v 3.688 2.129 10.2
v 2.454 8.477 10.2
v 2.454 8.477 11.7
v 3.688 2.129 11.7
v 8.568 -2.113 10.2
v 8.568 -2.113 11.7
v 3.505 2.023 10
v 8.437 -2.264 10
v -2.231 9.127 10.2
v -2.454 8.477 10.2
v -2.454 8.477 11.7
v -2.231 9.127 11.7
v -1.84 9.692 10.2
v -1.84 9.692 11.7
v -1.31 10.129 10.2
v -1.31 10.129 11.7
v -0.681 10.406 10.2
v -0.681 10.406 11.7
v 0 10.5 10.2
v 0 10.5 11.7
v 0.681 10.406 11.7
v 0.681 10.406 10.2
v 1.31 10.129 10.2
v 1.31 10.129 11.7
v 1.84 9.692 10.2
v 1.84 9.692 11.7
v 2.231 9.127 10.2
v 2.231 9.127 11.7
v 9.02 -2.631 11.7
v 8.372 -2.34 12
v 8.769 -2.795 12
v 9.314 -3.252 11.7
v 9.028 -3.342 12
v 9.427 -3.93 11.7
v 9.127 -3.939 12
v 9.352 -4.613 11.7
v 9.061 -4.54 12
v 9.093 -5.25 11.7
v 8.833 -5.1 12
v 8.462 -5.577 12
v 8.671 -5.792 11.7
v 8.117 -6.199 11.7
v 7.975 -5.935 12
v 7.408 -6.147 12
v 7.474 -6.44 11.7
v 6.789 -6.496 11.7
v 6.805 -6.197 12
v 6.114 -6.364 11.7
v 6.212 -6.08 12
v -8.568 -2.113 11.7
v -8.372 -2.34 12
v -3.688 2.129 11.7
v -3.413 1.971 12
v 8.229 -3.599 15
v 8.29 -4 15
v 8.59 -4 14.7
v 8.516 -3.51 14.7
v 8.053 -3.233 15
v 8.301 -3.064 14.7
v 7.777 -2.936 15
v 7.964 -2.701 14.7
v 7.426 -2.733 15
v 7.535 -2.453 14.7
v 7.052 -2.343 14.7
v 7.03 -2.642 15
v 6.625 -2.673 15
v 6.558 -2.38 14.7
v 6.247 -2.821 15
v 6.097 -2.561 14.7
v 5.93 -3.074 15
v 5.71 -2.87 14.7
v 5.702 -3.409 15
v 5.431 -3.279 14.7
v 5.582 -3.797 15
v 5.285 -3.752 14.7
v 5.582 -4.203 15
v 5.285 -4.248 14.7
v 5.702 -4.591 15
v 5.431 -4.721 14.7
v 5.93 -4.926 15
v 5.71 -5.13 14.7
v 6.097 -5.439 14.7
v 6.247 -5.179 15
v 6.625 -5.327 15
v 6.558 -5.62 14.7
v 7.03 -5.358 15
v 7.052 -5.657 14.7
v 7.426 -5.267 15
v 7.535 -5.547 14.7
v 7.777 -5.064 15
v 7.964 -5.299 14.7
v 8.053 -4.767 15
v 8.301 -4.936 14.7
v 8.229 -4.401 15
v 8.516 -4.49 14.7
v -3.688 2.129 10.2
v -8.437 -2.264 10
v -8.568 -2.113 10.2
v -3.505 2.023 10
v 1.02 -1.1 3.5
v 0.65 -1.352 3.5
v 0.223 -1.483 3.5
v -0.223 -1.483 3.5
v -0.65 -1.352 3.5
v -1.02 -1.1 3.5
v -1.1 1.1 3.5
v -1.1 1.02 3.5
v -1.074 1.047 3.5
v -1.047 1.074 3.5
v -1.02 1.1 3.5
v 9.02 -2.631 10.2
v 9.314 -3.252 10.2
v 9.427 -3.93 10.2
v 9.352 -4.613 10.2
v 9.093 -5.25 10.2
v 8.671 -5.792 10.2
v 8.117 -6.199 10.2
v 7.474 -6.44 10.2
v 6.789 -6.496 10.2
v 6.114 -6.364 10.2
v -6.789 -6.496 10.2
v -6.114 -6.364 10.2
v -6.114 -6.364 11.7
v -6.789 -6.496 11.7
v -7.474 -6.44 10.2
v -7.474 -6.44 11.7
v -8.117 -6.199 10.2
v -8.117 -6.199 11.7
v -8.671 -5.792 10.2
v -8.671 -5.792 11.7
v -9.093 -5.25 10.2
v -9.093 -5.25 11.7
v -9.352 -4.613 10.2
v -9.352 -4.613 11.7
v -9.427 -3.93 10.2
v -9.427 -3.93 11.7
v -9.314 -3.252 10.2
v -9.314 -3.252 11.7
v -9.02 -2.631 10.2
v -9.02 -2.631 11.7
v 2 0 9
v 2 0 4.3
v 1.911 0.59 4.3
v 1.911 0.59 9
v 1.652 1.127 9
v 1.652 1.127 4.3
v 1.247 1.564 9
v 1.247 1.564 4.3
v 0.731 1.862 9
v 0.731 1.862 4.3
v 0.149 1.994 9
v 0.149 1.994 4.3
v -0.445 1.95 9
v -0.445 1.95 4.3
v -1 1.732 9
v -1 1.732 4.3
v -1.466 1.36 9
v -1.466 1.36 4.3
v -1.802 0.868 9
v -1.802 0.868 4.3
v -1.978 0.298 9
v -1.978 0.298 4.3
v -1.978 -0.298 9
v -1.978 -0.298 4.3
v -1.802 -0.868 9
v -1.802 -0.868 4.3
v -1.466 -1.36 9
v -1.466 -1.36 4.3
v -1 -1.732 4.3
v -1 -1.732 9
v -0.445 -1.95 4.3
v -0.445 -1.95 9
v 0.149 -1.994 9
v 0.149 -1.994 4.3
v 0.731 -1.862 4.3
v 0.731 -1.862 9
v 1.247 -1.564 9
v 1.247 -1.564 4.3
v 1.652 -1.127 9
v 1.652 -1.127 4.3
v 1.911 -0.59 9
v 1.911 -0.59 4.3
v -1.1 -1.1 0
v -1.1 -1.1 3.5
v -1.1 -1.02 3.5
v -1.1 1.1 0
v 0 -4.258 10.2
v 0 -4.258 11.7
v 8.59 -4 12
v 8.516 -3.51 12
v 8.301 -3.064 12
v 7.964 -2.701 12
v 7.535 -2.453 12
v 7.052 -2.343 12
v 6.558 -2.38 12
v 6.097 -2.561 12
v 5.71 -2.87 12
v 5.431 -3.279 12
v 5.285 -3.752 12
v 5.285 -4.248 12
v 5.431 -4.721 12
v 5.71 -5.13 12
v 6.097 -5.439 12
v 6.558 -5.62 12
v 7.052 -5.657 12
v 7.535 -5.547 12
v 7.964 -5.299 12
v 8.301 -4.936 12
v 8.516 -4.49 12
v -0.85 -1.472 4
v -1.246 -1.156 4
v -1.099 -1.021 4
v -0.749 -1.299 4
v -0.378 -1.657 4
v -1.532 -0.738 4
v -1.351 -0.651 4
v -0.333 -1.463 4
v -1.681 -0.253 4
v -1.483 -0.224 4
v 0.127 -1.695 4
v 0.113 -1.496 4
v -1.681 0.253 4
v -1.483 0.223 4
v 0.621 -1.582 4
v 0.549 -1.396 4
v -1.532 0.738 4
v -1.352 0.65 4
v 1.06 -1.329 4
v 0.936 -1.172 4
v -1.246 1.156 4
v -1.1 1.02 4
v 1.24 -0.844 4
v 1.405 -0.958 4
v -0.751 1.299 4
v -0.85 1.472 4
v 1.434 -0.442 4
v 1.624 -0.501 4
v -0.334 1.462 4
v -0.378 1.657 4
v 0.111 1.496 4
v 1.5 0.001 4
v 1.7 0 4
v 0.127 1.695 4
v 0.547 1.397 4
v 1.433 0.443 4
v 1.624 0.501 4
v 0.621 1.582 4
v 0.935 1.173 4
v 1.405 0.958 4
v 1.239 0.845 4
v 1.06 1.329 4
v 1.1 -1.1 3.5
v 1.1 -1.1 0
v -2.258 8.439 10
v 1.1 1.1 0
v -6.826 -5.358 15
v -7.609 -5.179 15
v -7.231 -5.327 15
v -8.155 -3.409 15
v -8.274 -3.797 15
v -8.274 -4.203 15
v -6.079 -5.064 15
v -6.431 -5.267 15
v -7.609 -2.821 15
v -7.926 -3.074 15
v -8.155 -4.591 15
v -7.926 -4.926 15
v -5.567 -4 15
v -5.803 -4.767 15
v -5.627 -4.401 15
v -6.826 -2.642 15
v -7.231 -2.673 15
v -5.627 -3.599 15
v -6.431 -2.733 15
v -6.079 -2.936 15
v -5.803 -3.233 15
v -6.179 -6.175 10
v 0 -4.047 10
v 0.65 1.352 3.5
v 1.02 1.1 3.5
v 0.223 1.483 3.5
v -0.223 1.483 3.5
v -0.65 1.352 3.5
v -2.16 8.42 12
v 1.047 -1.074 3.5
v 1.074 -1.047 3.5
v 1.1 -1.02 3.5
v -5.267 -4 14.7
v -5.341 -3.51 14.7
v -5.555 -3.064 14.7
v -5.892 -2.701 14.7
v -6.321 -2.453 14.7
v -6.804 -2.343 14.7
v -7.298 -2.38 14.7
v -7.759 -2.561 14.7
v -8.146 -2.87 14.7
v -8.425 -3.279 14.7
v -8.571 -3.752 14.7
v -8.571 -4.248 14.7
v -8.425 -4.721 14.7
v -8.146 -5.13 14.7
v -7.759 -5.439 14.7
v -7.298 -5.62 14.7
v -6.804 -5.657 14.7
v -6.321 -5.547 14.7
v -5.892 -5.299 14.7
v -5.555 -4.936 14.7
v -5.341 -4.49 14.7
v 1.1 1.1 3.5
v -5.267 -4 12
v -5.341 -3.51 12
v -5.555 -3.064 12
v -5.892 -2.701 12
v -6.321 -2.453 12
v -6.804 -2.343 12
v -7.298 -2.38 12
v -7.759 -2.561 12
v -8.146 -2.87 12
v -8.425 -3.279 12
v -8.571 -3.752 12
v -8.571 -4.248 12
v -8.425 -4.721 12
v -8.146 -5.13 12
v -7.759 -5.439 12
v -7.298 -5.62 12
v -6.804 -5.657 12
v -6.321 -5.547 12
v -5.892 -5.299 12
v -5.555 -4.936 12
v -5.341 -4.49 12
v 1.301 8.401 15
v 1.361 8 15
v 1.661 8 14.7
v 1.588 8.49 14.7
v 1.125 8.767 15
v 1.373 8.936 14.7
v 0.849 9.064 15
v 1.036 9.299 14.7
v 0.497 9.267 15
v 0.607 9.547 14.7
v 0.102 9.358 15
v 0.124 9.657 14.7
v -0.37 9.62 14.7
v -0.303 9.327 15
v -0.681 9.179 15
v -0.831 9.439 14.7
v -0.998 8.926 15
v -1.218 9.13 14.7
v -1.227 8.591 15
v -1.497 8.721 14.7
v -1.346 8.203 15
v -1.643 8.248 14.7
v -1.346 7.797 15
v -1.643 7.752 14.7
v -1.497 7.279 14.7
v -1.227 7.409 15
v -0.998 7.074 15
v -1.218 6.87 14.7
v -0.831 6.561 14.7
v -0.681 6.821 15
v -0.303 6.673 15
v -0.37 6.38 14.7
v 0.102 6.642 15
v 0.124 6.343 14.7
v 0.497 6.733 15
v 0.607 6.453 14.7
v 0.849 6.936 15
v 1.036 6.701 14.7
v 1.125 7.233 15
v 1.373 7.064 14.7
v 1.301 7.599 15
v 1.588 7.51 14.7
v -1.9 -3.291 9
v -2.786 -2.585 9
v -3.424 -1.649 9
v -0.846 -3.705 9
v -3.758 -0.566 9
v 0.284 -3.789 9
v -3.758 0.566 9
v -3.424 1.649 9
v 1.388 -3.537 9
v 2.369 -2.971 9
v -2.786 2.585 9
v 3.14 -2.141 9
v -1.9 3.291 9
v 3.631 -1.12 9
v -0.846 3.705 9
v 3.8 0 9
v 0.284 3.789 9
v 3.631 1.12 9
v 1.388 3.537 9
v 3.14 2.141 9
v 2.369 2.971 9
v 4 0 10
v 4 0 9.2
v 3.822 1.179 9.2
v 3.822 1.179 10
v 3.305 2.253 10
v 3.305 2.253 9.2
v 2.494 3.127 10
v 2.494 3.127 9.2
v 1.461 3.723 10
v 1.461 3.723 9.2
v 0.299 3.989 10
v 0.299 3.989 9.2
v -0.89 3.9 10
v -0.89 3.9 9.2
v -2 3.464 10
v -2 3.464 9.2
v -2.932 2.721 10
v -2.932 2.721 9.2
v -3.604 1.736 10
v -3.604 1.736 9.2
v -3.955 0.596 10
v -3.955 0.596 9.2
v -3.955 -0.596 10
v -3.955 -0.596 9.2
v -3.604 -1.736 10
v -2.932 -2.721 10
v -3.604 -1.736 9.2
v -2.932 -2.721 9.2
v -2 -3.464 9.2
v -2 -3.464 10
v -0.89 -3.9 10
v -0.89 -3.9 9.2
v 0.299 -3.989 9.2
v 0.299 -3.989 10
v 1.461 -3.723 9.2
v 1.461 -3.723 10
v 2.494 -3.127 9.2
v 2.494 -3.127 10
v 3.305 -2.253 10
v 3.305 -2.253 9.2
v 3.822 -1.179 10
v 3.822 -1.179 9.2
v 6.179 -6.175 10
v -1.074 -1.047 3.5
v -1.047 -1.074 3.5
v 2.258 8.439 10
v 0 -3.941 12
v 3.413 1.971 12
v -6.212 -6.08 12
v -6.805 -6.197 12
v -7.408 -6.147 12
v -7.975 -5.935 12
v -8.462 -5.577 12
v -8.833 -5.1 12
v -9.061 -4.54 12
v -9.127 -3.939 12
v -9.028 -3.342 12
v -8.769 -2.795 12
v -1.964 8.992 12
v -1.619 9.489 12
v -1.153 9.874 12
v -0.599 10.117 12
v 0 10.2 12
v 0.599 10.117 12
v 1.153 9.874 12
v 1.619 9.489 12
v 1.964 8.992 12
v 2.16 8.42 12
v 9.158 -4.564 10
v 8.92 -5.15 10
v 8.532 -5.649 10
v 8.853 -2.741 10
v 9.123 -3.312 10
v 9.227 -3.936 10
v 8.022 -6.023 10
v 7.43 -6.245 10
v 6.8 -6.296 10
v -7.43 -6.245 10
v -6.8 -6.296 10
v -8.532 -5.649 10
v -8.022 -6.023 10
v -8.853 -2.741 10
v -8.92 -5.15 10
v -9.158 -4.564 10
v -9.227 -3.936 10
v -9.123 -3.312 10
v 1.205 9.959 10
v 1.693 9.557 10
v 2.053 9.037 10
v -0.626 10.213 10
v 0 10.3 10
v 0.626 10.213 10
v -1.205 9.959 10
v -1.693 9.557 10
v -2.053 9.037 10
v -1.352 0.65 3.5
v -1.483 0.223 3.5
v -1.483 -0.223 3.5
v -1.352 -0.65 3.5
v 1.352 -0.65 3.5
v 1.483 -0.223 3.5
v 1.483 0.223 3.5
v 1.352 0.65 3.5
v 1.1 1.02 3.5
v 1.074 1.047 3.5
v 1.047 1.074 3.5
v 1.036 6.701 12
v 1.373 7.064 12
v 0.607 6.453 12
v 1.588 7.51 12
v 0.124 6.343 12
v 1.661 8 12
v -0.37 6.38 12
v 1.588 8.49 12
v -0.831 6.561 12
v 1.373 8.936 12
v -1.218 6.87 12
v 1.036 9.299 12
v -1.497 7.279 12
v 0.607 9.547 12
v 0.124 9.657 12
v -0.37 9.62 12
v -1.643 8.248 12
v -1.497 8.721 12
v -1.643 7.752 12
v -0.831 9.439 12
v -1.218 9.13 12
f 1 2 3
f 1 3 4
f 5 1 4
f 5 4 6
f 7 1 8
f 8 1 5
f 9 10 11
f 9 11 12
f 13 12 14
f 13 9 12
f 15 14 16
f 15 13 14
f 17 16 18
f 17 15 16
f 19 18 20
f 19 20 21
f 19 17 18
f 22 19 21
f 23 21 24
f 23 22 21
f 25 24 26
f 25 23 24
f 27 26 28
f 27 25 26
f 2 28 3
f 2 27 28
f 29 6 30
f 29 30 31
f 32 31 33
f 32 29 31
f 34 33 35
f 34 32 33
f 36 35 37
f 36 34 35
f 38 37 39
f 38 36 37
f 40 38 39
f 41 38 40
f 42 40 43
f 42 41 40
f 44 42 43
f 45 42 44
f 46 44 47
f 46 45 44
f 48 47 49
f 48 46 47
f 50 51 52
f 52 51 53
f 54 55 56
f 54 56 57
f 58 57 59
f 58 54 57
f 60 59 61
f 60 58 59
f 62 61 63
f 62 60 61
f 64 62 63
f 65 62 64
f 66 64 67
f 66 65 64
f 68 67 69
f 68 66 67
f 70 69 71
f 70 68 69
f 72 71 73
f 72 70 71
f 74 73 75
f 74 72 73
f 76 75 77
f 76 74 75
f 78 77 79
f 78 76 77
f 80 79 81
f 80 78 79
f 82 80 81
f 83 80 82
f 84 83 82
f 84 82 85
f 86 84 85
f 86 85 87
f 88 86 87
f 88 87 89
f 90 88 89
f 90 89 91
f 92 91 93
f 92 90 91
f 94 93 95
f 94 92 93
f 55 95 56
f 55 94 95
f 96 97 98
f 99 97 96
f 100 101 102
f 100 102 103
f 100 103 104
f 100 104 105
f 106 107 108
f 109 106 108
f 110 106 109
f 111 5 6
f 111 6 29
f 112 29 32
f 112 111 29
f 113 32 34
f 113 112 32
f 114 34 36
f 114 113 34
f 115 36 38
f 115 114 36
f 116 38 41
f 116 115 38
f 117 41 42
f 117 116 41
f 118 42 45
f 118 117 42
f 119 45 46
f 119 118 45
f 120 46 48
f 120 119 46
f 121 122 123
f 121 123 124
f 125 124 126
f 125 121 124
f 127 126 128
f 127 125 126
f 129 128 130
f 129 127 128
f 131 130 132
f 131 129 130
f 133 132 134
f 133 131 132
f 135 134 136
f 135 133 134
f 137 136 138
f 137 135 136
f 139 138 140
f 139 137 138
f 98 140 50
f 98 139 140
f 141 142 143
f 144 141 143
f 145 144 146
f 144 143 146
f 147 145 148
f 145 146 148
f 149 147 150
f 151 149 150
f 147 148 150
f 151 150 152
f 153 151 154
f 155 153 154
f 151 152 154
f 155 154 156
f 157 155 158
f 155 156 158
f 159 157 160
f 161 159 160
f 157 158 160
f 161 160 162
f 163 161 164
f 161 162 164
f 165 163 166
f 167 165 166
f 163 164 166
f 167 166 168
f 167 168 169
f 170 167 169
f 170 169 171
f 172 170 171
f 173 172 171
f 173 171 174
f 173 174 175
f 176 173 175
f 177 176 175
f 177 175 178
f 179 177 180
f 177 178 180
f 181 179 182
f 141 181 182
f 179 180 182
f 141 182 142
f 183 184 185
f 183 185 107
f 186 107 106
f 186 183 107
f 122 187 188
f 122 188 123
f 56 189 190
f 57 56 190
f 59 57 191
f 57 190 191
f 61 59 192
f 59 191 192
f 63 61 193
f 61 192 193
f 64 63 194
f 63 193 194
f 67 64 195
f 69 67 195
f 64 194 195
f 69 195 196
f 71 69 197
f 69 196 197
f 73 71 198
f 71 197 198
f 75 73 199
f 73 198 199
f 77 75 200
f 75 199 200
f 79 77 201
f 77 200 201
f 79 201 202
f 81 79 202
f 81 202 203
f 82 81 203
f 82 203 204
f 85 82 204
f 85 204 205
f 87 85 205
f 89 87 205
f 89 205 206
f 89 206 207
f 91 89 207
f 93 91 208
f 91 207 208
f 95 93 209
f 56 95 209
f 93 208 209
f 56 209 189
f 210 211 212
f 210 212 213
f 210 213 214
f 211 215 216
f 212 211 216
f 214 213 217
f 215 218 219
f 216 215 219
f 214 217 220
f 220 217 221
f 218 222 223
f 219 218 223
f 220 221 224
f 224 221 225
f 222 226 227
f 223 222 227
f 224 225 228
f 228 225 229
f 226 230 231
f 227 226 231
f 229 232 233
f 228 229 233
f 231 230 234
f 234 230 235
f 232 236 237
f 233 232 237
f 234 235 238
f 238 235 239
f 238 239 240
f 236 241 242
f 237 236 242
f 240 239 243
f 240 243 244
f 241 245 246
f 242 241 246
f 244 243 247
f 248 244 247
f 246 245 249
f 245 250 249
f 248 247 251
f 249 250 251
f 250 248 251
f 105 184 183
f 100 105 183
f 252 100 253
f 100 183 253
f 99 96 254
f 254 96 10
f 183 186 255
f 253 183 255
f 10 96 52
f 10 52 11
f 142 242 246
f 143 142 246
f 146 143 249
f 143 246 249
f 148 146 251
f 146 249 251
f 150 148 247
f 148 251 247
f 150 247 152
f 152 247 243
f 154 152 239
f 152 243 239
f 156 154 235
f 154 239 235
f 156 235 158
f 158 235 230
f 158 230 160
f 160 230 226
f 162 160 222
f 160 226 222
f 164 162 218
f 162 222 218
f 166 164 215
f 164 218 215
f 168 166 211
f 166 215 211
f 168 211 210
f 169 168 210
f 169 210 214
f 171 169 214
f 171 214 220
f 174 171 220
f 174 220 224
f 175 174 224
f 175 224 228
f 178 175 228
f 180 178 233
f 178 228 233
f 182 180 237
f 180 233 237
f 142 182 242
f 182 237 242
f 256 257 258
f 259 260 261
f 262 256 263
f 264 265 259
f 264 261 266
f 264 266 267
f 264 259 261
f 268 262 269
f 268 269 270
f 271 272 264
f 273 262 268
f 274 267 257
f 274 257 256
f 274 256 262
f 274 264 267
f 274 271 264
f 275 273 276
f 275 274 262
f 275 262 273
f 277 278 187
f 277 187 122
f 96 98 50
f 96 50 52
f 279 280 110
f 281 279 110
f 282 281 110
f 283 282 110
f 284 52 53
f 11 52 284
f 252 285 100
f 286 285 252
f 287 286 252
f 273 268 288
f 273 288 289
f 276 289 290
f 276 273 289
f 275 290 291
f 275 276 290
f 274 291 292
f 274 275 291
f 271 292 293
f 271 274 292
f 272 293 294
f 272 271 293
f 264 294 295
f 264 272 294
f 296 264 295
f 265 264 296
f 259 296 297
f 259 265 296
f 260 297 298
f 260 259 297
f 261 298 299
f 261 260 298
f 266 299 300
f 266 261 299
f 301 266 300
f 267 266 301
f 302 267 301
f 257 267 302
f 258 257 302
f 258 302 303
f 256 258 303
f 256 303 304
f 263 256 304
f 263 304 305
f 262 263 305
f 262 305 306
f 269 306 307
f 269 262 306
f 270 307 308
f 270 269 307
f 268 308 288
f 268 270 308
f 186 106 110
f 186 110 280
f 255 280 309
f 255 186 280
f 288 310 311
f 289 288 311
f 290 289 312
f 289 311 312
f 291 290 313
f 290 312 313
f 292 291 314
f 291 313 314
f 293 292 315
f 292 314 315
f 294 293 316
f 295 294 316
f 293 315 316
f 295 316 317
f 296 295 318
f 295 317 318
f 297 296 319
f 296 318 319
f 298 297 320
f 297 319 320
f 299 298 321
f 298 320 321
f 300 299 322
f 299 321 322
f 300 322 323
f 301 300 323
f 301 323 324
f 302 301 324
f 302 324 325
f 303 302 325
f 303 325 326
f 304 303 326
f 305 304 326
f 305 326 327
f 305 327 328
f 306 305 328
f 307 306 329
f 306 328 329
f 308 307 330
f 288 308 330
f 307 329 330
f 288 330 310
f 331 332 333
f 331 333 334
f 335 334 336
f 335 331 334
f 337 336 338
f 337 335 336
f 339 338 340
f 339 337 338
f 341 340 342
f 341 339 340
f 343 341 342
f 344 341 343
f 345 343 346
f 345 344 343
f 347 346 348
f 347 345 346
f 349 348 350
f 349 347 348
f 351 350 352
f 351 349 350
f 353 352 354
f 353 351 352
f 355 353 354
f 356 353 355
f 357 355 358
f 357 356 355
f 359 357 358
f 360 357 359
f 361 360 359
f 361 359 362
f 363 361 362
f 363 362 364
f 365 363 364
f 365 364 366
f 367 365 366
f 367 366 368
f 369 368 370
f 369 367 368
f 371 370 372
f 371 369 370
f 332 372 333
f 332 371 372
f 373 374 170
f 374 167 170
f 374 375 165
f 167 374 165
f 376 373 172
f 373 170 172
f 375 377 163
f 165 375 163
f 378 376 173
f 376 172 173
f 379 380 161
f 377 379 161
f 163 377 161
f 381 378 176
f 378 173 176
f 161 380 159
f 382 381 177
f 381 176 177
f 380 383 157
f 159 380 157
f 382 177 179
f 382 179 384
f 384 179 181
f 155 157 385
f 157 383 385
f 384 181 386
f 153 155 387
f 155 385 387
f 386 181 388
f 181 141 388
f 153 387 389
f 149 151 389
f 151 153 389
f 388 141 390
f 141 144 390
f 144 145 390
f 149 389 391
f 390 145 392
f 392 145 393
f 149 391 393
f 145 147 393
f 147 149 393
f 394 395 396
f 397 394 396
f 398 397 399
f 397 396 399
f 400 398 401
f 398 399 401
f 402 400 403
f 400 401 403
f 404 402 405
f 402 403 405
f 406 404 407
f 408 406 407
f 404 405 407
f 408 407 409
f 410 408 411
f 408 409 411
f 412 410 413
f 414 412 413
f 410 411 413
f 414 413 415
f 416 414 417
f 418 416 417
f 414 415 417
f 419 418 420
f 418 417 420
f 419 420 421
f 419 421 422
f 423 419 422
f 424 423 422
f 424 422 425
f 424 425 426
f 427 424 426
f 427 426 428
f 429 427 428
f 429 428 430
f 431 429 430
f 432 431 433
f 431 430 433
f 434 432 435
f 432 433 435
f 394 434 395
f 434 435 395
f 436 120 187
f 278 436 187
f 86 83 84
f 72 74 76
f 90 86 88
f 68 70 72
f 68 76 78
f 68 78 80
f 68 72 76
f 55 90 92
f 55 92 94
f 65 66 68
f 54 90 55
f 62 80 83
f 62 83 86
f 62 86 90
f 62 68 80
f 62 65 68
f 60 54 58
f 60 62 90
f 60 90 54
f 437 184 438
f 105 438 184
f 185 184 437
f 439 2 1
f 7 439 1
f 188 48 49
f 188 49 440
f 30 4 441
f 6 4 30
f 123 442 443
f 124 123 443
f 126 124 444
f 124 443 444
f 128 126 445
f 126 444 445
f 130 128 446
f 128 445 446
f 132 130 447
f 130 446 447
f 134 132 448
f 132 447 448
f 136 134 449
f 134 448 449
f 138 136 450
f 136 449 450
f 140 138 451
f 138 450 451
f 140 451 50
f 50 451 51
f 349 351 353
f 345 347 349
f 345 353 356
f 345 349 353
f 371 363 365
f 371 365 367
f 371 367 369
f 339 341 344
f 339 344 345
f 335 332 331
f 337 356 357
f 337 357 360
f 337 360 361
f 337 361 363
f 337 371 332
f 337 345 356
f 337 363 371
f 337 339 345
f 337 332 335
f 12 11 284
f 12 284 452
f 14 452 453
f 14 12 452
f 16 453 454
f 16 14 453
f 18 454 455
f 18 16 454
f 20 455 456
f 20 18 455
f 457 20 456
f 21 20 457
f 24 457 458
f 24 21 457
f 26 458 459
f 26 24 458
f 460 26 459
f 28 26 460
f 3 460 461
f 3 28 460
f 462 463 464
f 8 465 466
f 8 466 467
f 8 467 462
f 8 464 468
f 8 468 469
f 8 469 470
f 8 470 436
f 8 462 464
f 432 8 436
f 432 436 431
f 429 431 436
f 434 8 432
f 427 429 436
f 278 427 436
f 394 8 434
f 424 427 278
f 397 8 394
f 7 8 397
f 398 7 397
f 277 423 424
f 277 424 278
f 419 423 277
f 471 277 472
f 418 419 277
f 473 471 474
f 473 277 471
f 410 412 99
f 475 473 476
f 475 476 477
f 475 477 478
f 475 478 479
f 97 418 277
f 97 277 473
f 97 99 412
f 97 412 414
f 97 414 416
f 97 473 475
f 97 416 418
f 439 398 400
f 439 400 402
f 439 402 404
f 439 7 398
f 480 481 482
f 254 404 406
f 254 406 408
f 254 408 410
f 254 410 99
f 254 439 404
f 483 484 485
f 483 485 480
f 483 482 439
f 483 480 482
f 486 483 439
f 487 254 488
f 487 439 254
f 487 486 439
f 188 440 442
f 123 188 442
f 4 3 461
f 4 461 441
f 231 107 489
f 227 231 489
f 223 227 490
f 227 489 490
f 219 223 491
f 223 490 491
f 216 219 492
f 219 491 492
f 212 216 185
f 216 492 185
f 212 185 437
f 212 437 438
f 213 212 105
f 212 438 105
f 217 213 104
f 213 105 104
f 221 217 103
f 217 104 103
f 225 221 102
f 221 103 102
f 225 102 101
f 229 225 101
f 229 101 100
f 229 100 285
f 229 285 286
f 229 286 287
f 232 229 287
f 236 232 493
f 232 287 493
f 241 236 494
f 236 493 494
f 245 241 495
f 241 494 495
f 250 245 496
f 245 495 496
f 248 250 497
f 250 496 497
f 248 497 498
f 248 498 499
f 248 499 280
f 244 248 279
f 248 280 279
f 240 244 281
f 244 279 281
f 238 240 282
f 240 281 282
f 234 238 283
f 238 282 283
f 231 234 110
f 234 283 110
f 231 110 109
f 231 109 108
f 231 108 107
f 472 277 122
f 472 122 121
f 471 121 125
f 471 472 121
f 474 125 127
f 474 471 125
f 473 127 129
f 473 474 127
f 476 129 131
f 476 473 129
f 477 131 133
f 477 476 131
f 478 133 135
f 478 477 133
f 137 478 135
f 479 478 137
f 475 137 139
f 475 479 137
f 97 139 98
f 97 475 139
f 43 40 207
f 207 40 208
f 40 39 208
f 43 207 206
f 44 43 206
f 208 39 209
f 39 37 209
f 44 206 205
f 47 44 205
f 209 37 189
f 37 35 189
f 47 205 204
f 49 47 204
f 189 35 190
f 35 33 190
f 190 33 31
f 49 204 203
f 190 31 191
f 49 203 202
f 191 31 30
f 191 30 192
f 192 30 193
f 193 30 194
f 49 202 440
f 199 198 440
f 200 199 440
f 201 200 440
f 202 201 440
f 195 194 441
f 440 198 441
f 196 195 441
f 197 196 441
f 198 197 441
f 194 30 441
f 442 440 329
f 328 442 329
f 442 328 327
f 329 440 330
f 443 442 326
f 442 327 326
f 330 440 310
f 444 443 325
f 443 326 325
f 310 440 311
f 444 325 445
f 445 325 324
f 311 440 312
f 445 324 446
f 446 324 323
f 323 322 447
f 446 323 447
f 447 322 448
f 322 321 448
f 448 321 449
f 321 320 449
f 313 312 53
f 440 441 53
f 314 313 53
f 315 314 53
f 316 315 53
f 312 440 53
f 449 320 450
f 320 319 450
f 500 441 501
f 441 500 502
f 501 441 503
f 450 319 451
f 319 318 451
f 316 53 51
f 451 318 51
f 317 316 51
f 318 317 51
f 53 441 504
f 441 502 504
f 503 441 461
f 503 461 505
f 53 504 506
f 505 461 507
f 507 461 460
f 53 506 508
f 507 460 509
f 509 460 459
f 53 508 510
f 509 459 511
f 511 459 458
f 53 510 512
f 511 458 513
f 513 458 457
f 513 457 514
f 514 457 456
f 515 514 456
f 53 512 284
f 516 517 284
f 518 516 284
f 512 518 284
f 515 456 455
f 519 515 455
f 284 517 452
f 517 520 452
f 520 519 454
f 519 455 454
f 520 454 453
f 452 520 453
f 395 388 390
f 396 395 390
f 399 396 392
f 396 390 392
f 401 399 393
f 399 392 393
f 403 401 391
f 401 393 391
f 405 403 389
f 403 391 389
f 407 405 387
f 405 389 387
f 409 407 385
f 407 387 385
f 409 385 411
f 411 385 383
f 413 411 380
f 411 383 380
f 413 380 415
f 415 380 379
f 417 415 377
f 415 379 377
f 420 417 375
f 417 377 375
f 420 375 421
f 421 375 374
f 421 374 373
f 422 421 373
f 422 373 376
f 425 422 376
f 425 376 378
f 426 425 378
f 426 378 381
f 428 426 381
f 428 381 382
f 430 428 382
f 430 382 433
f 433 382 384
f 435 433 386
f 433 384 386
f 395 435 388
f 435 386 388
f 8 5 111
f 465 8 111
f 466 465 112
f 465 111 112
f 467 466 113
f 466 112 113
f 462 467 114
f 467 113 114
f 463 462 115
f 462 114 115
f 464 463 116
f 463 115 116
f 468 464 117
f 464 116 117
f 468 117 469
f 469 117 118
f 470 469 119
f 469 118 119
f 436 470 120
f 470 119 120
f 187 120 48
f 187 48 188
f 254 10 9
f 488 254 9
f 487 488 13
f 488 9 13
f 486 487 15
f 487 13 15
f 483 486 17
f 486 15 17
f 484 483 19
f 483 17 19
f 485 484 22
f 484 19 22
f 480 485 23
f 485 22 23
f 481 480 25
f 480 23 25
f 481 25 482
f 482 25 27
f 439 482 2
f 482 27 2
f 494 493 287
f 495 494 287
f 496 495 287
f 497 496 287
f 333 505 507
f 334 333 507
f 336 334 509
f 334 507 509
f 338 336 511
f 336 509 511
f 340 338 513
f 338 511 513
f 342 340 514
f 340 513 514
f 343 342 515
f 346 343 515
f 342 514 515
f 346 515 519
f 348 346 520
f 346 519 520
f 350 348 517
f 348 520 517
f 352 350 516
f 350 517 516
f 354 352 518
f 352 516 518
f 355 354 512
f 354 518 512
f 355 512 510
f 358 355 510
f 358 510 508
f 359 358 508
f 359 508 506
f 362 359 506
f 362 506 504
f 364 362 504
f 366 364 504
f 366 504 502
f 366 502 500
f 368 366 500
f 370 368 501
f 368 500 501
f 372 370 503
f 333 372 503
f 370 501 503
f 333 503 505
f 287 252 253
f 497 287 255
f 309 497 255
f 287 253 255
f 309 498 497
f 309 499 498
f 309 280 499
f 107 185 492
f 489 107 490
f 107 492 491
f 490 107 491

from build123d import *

# Parameters (mm, degrees)
SCHIZZO1_W                   = 2.2
SCHIZZO1_H                   = 2.2
ESTRUSIONE_ESTRUSIONE1_DEPTH = 3.5
SCHIZZO2_R                   = 1.5
ESTRUSIONE_ESTRUSIONE2_DEPTH = 0.5
SCHIZZO3_R                   = 2
ESTRUSIONE_ESTRUSIONE3_DEPTH = 5
SCHIZZO4_R                   = 4
ESTRUSIONE_ESTRUSIONE4_DEPTH = 1
ESTRUSIONE_ESTRUSIONE7_DEPTH = 2
SCHIZZO12_R                  = 1.66147464
ESTRUSIONE_ESTRUSIONE8_DEPTH = 3
SMUSSO4_SIZE                 = 0.2
SMUSSO5_SIZE                 = 0.3


with BuildPart() as part:
    # Schizzo1 → Estrusione-Estrusione1 (new body)
    with BuildSketch(Plane.XY):
        Rectangle(SCHIZZO1_W, SCHIZZO1_H)
    extrude(amount=ESTRUSIONE_ESTRUSIONE1_DEPTH)

    # Schizzo2 → Estrusione-Estrusione2 (add)
    with BuildSketch(Plane.XY.offset(3.5)):
        with Locations(Location((0, 0, 0), (0, 0, 137.166571934))):
            Circle(SCHIZZO2_R)
    extrude(amount=ESTRUSIONE_ESTRUSIONE2_DEPTH)

    # Schizzo3 → Estrusione-Estrusione3 (add)
    with BuildSketch(Plane.XY.offset(4)):
        Circle(SCHIZZO3_R)
    extrude(amount=ESTRUSIONE_ESTRUSIONE3_DEPTH)

    # Schizzo4 → Estrusione-Estrusione4 (add)
    with BuildSketch(Plane.XY.offset(9)):
        Circle(SCHIZZO4_R)
    extrude(amount=ESTRUSIONE_ESTRUSIONE4_DEPTH)

    # Schizzo11 → Estrusione-Estrusione7 (add)
    with BuildSketch(Plane.XY.offset(10)):
        with BuildLine():
            Line((-3.687951879, 2.12924001), (-2.454067959, 8.477022488))
            ThreePointArc((-2.454067959, 8.477022488), (0, 10.5), (2.454067959, 8.477022488))
            Line((2.454067959, 8.477022488), (3.687951879, 2.12924001))
            Line((3.687951879, 2.12924001), (8.568350803, -2.113226049))
            ThreePointArc((8.568350803, -2.113226049), (9.09326674, -5.25), (6.114282844, -6.363796439))
            Line((6.114282844, -6.363796439), (0, -4.25848002))
            Line((0, -4.25848002), (-6.114282844, -6.363796439))
            ThreePointArc((-6.114282844, -6.363796439), (-9.09326674, -5.25), (-8.568350803, -2.113226049))
            Line((-8.568350803, -2.113226049), (-3.687951879, 2.12924001))
        make_face()
    extrude(amount=ESTRUSIONE_ESTRUSIONE7_DEPTH)

    # Schizzo12 → Estrusione-Estrusione8 (add)
    with BuildSketch(Plane.XY.offset(12)):
        with Locations((0, 8)):
            Circle(SCHIZZO12_R)
        with Locations((6.92820323, -4)):
            Circle(SCHIZZO12_R)
        with Locations((-6.92820323, -4)):
            Circle(SCHIZZO12_R)
    extrude(amount=ESTRUSIONE_ESTRUSIONE8_DEPTH)

    # Smusso4
    smusso4_edges = [part.edges().sort_by_distance(p)[0] for p in [
        (-4, 0, 9),
        (-6.128151341, 0.00800698, 10),
        (-9.09326674, -5.25, 10),
        (-3.057141422, -5.31113823, 10),
        (3.057141422, -5.31113823, 10),
        (9.09326674, -5.25, 10),
        (6.128151341, 0.00800698, 10),
        (3.071009919, 5.303131249, 10),
        (0, 10.5, 10),
        (-3.071009919, 5.303131249, 10),
    ]]
    chamfer(smusso4_edges, length=SMUSSO4_SIZE)

    # Smusso5
    smusso5_edges = [part.edges().sort_by_distance(p)[0] for p in [
        (-2, 0, 4),
        (-6.128151341, 0.00800698, 12),
        (-9.09326674, -5.25, 12),
        (-3.057141422, -5.31113823, 12),
        (3.057141422, -5.31113823, 12),
        (9.09326674, -5.25, 12),
        (6.128151341, 0.00800698, 12),
        (3.071009919, 5.303131249, 12),
        (0, 10.5, 12),
        (-3.071009919, 5.303131249, 12),
        (-1.66147464, 8, 15),
        (5.266728591, -4, 15),
        (-8.58967787, -4, 15),
    ]]
    chamfer(smusso5_edges, length=SMUSSO5_SIZE)


solid = part.part
